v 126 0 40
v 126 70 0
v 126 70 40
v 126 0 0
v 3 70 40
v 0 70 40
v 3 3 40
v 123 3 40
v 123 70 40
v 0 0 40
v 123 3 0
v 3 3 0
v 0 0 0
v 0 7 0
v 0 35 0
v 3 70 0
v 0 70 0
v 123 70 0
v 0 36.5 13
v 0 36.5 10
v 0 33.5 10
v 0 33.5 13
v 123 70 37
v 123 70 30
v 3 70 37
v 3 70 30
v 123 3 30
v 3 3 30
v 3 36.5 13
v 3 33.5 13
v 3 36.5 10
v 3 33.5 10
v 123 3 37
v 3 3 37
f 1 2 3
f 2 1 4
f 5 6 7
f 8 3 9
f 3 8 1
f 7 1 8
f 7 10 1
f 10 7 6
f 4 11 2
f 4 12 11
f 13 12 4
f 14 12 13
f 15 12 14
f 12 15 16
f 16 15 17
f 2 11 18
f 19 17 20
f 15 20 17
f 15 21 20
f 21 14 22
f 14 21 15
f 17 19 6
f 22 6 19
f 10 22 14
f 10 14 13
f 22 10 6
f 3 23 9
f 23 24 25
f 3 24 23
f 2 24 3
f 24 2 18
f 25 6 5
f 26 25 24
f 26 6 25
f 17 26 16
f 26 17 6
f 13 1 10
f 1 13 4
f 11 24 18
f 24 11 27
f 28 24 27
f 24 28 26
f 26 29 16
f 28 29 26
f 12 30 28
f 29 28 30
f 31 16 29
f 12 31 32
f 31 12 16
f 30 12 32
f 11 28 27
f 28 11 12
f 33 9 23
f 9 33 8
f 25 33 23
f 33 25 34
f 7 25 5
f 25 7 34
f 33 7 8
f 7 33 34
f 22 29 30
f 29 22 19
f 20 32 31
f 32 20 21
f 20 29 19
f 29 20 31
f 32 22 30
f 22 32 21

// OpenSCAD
// Open-top rectangular buffer tank for a mini horizontal gel-electrophoresis box. NOVEL general part.
//

inner_l = 120;
inner_w = 70;
height  = 40;
wall    = 3;
platform_t = 3;
channel_h = 10;
electrode_d = 2;

$fn = 48;

inner_h = height - wall;
p       = min(platform_t, inner_h - channel_h);          // keep the channel above the platform

difference() {
    cube([inner_l + 2 * wall, inner_w, height]);
    translate([wall, wall, 0]) cube([inner_l, inner_w, height - channel_h]);   // floor + back wall below the channel
    translate([wall, wall, height - wall]) cube([inner_l, inner_w, wall]);            // top wall (open top)
    translate([-1, inner_w / 2 - 1.5, channel_h]) cube([inner_l + 2, 3, p]);                 // central platform (spans width, reduced Y to clear the wall it passes through)
    for (y = [-inner_w / 2, inner_w / 2])
        translate([0, y, -1]) rotate([-90, 0, 0]) cylinder(h = height + 2, d = electrode_d);   // electrode holes, horizontal along X, at the two Y ends
}
